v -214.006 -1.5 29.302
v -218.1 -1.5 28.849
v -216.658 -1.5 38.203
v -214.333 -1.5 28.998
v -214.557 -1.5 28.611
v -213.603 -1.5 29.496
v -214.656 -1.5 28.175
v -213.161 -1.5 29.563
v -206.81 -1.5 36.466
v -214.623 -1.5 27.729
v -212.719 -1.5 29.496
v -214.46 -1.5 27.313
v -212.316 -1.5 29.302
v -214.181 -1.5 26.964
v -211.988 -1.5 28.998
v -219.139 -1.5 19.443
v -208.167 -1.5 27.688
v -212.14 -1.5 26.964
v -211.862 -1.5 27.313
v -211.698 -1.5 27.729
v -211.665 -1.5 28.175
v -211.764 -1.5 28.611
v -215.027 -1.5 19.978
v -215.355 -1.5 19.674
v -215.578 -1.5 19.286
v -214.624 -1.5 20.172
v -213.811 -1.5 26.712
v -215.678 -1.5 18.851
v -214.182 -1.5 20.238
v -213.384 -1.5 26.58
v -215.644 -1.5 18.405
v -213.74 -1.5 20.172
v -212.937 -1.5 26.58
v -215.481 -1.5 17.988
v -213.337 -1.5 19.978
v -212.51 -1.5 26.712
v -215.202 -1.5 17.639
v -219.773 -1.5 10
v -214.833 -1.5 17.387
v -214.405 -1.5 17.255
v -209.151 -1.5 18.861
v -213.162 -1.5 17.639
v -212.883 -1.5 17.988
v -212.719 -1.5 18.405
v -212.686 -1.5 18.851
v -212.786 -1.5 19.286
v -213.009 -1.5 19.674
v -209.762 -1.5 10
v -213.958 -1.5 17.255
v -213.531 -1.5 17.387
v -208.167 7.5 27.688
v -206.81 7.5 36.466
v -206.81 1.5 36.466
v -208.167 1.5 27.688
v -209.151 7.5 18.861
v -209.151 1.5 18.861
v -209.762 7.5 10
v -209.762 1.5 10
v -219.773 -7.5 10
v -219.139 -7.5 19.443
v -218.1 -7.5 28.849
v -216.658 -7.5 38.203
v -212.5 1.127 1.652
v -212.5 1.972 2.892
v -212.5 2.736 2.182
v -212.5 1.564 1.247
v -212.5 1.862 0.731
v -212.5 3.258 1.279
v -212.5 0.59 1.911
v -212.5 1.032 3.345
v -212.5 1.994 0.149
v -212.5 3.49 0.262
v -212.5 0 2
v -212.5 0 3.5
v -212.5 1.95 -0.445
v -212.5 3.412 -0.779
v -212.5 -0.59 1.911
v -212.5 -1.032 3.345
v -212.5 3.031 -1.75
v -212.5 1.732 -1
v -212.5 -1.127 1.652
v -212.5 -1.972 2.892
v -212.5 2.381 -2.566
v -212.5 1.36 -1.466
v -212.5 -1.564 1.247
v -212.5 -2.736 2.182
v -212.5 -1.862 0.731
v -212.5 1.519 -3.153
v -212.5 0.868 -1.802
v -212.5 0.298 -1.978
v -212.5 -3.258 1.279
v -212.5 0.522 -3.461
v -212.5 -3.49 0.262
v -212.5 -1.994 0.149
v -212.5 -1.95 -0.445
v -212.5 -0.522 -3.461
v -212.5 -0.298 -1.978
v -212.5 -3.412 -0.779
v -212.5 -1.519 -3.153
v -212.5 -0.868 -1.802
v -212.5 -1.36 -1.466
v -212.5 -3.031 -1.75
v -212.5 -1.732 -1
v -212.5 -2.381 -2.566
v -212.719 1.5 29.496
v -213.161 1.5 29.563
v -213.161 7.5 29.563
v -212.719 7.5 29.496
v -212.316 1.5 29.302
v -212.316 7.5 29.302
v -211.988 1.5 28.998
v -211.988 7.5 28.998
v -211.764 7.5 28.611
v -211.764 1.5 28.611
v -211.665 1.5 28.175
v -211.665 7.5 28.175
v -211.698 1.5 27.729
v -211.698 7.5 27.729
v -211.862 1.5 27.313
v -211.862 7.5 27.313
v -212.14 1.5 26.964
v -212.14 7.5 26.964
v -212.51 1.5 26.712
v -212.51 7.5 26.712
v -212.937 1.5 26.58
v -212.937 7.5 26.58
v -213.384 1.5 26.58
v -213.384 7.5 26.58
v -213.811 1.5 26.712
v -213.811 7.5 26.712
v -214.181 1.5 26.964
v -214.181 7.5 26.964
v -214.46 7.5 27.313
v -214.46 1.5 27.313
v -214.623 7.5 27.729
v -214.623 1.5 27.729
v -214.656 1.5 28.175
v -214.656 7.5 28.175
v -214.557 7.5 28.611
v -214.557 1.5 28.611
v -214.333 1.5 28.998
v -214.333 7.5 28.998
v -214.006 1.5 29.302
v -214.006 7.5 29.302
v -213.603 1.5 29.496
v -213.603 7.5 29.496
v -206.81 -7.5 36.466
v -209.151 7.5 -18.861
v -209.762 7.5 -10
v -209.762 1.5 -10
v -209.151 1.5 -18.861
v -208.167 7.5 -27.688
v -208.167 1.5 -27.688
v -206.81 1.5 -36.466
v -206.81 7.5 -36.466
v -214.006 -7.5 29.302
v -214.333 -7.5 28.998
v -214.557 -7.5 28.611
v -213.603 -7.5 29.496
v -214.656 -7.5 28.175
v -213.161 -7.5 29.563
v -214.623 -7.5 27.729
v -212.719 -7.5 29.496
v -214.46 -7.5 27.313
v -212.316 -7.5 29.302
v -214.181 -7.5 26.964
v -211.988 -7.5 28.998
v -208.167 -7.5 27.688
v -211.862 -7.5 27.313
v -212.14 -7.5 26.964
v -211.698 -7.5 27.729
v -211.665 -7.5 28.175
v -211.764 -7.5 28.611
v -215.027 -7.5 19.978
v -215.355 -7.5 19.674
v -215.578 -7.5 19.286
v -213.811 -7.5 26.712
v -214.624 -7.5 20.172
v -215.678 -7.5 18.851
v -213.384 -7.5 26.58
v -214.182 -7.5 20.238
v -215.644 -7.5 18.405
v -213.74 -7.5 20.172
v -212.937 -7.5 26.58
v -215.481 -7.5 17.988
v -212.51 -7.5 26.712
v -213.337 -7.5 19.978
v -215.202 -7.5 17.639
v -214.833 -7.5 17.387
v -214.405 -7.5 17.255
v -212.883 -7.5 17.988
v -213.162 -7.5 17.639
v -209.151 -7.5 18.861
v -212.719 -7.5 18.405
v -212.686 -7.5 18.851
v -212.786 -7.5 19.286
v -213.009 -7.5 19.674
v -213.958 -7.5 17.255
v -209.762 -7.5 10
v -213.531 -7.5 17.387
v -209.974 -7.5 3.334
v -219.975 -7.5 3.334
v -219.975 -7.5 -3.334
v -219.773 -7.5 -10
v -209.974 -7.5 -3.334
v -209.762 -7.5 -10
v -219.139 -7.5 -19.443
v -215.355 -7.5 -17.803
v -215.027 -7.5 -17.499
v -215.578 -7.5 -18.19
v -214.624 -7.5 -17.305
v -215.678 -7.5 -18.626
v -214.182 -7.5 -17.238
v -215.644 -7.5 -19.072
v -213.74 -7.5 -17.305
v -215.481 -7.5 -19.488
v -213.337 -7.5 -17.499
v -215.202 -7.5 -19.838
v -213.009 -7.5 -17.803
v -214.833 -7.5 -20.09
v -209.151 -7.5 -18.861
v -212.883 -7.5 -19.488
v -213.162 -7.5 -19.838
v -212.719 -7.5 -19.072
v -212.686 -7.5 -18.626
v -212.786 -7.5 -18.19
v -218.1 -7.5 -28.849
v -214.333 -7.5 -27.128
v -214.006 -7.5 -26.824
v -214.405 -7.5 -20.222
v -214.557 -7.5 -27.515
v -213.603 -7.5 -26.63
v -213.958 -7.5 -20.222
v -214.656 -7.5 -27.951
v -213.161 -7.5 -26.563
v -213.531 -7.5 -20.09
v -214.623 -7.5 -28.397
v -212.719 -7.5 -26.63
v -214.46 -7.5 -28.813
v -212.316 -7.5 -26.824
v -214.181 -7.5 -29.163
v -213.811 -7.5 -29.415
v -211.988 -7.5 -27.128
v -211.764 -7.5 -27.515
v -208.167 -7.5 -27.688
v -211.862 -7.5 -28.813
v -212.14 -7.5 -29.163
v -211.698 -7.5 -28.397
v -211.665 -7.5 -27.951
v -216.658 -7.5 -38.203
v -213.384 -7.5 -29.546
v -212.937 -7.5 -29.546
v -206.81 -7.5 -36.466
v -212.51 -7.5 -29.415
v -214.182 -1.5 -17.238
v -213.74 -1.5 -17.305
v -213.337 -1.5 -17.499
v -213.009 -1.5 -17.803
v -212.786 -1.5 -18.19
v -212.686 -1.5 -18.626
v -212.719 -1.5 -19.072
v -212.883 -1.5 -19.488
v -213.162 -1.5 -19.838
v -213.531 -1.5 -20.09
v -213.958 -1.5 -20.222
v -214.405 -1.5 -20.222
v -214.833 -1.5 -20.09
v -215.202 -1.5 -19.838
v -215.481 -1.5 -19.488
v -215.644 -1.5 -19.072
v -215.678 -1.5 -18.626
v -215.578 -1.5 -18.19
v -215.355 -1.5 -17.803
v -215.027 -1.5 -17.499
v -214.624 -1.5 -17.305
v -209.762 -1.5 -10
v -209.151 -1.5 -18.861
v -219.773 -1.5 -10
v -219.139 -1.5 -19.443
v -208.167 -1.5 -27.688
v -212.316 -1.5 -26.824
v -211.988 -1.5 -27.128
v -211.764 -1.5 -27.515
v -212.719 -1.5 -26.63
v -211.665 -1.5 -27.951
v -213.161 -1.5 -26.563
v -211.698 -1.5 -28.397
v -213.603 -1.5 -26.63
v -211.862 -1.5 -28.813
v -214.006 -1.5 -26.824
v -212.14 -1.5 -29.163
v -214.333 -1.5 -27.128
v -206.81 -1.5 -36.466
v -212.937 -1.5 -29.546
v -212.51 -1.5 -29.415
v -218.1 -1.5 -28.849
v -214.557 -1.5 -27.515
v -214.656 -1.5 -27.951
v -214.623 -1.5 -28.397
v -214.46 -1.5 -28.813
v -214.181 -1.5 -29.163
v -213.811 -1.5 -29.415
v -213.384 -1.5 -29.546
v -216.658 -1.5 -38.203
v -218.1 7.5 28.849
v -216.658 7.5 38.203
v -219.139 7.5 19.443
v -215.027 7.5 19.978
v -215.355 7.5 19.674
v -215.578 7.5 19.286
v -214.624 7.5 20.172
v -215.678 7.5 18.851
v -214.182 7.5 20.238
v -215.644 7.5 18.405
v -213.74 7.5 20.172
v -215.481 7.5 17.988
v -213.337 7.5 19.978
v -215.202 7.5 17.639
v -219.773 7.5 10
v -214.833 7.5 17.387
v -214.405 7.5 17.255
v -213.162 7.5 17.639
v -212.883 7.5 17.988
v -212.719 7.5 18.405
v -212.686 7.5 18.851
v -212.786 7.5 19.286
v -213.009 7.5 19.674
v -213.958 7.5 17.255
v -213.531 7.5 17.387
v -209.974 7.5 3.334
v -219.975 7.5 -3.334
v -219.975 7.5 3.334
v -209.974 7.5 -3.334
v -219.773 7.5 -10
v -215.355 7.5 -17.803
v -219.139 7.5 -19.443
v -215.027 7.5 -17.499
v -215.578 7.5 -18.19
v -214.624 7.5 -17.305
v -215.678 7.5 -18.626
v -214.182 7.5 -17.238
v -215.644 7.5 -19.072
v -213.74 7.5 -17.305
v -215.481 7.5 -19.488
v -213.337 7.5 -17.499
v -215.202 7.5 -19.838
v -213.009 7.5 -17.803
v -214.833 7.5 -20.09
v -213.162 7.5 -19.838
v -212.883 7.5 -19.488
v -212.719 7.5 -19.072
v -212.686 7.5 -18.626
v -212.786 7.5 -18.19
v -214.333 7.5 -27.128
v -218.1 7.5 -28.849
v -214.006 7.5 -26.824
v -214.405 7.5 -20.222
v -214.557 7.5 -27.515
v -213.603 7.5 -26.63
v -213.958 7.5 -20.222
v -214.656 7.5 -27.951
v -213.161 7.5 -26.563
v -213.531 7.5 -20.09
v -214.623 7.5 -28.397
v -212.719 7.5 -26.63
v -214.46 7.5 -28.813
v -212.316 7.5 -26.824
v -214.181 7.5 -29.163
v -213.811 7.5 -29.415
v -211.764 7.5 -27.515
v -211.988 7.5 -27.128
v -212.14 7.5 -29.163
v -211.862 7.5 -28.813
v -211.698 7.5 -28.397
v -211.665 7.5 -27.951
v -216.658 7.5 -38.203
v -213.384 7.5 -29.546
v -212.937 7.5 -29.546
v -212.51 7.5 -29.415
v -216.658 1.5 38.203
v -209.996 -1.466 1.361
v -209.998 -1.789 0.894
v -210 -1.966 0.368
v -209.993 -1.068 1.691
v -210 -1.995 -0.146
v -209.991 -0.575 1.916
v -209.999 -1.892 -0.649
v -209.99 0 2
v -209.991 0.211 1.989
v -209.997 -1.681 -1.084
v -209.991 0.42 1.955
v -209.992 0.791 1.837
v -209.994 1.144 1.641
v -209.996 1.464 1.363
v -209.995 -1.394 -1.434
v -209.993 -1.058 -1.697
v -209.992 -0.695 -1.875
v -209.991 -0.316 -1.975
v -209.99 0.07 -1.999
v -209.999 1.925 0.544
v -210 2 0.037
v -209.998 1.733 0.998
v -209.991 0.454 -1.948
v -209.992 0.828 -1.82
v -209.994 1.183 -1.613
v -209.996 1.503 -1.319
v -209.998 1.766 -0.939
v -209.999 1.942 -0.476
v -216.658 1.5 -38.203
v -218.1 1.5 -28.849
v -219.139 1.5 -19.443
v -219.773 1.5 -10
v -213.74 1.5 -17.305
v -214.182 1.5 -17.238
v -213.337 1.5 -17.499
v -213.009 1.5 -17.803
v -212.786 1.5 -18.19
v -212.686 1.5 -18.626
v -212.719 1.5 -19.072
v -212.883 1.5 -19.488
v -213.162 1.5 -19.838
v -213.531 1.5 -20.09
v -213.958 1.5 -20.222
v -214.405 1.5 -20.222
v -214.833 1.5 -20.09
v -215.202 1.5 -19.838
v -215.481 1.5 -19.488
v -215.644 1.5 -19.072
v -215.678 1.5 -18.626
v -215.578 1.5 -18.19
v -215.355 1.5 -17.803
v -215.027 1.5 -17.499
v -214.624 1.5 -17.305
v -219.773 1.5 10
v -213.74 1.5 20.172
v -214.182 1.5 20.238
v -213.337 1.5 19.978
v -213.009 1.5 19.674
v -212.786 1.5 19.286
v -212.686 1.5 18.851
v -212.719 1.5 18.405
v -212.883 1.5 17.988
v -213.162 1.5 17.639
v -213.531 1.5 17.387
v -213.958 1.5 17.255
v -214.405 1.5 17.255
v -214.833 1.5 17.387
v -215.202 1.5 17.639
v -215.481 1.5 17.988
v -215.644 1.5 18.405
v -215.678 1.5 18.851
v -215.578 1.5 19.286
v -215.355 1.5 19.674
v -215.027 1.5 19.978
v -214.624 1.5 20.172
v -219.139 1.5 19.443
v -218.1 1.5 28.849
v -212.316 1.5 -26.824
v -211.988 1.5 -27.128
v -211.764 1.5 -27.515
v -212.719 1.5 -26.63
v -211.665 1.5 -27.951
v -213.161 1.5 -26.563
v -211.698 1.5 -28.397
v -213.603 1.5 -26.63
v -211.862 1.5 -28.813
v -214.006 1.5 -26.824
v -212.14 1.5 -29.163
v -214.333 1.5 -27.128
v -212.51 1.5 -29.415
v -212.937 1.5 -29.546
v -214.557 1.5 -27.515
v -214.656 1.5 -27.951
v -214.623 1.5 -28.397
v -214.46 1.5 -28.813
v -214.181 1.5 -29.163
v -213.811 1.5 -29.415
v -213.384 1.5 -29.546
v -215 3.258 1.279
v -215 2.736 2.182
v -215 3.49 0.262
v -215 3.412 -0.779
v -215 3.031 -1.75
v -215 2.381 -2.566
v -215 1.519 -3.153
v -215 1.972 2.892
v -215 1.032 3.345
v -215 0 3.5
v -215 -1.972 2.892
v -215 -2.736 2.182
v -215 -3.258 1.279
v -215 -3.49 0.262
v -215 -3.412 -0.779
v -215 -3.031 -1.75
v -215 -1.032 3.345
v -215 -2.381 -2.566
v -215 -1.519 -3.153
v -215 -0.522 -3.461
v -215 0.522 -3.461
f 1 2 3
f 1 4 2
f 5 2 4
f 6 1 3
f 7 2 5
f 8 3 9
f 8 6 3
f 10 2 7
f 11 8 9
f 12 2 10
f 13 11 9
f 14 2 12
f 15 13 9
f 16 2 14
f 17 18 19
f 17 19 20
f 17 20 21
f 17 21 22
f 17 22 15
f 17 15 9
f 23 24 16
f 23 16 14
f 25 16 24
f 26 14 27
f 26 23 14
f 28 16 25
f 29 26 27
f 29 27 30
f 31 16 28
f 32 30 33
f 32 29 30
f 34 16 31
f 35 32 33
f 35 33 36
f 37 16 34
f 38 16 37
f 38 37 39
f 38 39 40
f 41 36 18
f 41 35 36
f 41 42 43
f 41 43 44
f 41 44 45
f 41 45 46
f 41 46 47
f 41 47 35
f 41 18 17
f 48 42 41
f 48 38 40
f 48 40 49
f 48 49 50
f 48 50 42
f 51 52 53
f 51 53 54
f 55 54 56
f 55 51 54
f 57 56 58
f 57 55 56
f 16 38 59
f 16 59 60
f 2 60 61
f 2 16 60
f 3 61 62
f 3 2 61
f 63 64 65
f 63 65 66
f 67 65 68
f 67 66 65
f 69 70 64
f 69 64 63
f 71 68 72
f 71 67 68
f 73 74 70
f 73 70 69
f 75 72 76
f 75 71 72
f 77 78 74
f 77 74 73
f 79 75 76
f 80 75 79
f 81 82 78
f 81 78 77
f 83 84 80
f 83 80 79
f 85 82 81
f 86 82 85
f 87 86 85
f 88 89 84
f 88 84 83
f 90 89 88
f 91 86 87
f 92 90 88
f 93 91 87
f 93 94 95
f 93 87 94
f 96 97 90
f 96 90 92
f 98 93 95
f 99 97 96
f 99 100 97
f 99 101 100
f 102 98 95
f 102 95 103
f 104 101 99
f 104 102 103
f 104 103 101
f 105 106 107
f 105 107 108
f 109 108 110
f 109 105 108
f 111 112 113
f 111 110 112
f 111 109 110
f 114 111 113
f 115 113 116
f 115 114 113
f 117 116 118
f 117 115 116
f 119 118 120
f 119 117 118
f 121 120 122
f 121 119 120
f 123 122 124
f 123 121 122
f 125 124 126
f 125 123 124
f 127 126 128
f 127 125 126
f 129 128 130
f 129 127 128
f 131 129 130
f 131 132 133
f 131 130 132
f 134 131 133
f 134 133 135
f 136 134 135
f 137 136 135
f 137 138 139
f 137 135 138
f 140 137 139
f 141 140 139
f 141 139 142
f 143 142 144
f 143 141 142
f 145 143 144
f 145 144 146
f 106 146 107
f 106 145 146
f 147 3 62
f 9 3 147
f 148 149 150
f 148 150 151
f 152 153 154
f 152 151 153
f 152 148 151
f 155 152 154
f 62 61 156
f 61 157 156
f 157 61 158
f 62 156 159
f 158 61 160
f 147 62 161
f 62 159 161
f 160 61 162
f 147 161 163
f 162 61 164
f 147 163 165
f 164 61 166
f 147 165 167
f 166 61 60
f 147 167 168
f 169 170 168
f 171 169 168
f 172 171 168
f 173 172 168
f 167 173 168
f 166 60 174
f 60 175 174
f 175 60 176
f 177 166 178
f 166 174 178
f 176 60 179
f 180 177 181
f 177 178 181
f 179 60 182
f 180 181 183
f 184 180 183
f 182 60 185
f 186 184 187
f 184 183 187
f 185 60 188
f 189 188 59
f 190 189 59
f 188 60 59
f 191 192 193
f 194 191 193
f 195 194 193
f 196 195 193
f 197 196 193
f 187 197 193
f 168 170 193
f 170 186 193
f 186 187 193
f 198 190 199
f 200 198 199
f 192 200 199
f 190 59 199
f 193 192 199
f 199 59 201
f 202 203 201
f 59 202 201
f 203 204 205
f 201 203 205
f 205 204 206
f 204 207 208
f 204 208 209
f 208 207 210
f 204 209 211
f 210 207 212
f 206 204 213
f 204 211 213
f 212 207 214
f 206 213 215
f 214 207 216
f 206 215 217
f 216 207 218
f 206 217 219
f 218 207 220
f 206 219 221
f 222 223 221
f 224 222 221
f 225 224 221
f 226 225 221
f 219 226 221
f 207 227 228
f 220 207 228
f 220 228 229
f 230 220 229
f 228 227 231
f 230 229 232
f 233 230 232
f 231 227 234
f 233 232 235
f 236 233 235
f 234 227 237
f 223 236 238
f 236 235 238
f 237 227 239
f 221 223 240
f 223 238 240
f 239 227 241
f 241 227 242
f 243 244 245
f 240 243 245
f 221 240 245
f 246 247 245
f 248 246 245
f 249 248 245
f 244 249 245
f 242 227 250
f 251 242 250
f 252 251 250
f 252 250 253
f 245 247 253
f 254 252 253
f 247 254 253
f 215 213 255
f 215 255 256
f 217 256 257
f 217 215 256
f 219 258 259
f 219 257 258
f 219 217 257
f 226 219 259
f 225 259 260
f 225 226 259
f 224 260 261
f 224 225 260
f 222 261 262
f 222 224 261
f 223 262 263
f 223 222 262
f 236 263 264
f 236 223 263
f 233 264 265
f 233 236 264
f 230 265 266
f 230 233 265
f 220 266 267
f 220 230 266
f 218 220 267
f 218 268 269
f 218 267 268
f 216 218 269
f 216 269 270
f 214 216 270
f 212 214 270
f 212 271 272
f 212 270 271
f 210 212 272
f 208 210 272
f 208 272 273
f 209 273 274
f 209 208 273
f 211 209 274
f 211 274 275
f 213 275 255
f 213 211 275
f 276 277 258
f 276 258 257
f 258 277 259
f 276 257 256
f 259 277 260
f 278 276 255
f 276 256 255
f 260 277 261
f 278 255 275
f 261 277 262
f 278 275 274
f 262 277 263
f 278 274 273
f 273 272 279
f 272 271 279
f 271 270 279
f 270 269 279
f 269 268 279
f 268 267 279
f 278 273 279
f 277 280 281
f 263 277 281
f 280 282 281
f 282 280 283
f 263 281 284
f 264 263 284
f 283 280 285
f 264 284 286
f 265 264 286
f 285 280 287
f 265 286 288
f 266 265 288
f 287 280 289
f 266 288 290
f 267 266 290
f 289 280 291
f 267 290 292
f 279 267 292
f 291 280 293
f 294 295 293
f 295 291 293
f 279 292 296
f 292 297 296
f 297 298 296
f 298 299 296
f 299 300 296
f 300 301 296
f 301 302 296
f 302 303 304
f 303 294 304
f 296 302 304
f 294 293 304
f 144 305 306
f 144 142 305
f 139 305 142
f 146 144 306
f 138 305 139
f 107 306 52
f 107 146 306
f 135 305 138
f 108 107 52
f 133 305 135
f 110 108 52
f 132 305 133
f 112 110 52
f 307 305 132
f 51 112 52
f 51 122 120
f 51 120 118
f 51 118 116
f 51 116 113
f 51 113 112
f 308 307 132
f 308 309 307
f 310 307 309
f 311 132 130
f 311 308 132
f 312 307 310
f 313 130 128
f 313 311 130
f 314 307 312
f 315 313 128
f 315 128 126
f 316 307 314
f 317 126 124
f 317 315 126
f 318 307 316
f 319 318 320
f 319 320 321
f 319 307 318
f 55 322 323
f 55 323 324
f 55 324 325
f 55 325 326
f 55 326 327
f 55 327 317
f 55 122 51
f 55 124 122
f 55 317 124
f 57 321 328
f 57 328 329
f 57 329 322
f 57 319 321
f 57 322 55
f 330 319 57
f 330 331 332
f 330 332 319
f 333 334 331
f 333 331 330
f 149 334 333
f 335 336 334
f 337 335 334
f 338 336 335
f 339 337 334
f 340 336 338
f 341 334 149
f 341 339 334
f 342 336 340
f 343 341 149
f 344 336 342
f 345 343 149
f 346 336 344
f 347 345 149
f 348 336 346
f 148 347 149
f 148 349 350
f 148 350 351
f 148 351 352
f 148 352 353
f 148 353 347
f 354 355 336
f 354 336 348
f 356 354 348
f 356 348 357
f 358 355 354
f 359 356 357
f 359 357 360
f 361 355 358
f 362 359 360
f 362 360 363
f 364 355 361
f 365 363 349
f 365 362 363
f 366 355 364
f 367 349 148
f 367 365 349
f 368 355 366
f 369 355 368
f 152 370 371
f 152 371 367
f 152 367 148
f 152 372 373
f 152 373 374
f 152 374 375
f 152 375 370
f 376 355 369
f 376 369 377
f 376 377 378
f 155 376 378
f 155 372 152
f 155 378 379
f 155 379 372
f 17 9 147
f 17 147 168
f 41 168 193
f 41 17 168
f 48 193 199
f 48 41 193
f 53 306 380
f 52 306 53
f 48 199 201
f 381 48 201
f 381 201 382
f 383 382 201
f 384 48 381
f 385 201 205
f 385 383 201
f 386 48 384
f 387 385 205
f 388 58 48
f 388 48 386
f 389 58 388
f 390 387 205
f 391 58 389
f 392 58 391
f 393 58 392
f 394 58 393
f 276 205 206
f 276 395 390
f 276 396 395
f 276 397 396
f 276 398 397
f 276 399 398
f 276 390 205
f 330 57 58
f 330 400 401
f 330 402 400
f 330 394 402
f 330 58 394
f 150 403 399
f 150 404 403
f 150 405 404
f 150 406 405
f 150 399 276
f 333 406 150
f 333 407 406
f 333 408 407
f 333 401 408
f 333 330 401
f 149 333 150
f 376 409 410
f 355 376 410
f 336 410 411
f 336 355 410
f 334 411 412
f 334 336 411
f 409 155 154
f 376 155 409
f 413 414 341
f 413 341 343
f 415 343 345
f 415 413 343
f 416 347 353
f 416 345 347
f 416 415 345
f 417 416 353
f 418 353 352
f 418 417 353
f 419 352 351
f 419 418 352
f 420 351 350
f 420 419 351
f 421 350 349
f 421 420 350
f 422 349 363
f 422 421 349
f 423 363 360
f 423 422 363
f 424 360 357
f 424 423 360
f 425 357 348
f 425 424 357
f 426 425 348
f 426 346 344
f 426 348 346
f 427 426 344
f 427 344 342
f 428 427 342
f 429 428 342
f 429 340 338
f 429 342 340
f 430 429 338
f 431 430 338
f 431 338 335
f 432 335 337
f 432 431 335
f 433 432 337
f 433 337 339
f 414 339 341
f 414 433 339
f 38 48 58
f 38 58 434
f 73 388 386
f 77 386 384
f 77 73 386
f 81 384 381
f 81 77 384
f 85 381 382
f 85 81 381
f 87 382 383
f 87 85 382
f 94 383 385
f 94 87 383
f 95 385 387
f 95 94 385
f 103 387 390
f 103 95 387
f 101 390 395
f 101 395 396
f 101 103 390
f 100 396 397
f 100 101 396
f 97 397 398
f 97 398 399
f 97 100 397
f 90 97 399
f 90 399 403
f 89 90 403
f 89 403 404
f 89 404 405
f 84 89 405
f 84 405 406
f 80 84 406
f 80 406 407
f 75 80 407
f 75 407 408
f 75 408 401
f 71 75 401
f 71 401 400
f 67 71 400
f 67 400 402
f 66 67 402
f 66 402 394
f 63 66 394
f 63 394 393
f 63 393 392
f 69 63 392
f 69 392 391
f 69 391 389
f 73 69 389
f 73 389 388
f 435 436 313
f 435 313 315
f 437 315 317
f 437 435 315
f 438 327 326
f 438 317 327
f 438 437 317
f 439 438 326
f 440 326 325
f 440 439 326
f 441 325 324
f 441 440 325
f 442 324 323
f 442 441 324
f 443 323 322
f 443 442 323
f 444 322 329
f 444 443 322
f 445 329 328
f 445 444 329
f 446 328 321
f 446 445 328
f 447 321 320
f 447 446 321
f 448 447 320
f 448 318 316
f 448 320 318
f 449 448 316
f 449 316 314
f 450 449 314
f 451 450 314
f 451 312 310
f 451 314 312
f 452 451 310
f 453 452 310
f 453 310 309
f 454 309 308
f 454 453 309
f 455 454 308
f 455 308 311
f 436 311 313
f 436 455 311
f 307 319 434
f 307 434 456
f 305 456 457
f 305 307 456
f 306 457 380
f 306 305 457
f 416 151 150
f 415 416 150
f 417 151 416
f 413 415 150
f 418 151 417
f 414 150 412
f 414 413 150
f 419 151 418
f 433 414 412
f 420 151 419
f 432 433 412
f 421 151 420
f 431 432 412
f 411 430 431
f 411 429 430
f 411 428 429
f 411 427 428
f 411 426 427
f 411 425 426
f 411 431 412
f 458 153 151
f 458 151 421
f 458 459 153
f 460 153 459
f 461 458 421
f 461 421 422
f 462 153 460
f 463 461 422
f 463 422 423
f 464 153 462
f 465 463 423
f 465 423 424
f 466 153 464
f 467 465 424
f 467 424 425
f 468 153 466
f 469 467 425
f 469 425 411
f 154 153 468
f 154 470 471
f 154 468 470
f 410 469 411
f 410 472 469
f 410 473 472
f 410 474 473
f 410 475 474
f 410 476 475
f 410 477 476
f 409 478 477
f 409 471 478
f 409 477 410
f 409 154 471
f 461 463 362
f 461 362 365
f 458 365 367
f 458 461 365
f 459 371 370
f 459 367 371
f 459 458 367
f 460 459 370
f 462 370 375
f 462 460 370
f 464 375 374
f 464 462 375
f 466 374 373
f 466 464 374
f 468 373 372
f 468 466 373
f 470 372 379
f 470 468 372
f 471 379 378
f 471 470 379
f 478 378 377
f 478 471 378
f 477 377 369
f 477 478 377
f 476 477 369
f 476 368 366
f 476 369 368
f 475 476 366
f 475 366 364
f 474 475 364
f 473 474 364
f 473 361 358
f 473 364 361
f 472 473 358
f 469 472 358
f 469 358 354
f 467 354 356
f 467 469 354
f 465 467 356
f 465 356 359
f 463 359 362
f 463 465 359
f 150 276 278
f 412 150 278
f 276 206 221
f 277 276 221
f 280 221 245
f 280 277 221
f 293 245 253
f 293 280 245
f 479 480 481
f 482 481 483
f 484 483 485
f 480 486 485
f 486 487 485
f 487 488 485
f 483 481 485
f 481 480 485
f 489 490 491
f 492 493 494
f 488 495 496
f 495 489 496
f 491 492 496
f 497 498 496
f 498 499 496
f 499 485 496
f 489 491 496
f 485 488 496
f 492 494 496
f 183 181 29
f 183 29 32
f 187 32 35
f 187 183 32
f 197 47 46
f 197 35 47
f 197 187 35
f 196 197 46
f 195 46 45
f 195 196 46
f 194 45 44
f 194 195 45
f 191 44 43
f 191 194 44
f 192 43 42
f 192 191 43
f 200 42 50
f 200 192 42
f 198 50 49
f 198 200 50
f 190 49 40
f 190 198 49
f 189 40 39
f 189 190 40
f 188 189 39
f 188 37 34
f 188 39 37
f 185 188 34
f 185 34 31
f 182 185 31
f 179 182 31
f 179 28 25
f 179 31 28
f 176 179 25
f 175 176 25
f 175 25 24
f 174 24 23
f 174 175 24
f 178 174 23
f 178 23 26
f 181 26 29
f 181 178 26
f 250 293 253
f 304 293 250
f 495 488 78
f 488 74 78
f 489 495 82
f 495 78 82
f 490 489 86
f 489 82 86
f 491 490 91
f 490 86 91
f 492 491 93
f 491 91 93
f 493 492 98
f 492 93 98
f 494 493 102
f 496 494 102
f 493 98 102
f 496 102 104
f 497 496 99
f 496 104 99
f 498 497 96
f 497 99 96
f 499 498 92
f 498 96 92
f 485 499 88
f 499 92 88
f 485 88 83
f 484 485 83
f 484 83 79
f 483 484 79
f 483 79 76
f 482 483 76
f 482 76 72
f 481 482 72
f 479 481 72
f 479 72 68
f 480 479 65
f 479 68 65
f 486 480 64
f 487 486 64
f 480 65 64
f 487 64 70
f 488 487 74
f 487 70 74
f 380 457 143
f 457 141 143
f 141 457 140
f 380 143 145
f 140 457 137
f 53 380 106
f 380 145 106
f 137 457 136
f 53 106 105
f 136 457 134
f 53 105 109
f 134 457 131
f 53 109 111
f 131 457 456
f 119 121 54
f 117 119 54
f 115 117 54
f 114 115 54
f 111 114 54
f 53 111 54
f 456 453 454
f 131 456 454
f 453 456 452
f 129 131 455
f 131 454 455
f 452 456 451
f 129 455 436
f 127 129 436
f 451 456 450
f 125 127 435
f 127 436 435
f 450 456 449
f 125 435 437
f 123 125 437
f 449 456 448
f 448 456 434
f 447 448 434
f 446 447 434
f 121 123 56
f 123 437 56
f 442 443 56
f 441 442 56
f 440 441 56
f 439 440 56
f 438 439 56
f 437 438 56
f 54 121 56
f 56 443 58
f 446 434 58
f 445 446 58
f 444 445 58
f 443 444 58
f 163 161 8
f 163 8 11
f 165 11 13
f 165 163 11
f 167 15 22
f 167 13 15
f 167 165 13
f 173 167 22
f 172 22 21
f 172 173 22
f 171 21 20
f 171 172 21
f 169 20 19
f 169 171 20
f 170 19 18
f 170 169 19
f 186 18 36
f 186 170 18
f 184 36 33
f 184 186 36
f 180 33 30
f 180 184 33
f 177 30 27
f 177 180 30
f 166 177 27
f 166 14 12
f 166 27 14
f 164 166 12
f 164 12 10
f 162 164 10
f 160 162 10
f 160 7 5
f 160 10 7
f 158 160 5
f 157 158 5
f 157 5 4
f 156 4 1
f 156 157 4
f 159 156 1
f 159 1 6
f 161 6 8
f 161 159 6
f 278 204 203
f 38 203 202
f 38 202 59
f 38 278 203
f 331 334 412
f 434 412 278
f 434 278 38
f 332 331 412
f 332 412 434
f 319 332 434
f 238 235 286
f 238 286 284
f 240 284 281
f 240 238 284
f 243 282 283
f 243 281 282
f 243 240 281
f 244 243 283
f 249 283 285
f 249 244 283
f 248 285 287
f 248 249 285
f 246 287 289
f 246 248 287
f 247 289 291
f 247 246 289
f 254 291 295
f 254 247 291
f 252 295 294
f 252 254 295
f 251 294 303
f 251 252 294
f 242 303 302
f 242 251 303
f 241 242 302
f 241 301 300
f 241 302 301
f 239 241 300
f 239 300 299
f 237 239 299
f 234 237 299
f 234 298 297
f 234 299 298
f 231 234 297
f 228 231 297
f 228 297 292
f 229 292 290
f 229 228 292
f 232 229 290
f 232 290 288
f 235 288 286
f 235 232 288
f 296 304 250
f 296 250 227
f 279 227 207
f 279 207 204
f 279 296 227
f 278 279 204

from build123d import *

# Parameters (mm, degrees)
BASE2_DEPTH            = 7.5
MOUNT2_START           = -1.5
MOUNT2_DEPTH           = 3
MOUNT_HOLE2_DEPTH      = 224.418192135
MOUNT_HOLE2_DEPTH_BACK = 224.418192135
SKETCH16_R             = 1.5
SKETCH17_R             = 2
SHAFT_HOLE_DEPTH       = 40.784051683
SKETCH18_W             = 2.5
SKETCH18_H             = 3.5


with BuildPart() as part:
    # Sketch13 → base2 (new, symmetric)
    with BuildSketch(Plane(origin=(0, 0, 0), x_dir=(1, 0, 0), z_dir=(0, 1, 0))):
        with BuildLine():
            ThreePointArc((-209.761769634, 10), (-208.70564487, 23.279901188), (-206.809628133, 36.46611731))
            Line((-206.809628133, 36.46611731), (-216.657705663, 38.202599087))
            ThreePointArc((-216.657705663, 38.202599087), (-218.670303662, 24.151569236), (-219.772609758, 10))
            Line((-219.772609758, 10), (-209.761769634, 10))
        make_face()
        with BuildLine():
            ThreePointArc((-209.761769634, -10), (-210, 0), (-209.761769634, 10))
            Line((-209.761769634, 10), (-219.772609758, 10))
            ThreePointArc((-219.772609758, 10), (-220, 0), (-219.772609758, -10))
            Line((-219.772609758, -10), (-209.761769634, -10))
        make_face()
        with BuildLine():
            Line((-216.657705663, -38.202599087), (-206.809628133, -36.46611731))
            ThreePointArc((-206.809628133, -36.46611731), (-208.70564487, -23.279901188), (-209.761769634, -10))
            Line((-209.761769634, -10), (-219.772609758, -10))
            ThreePointArc((-219.772609758, -10), (-218.670303662, -24.151569236), (-216.657705663, -38.202599087))
        make_face()
    extrude(amount=BASE2_DEPTH, both=True)

    # Sketch14 → mount2 (cut)
    with BuildSketch(Plane(origin=(0, 0, 0), x_dir=(1, 0, 0), z_dir=(0, 1, 0)).offset(MOUNT2_START)):
        with BuildLine():
            Line((-209.761769634, -10), (-219.772609758, -10))
            ThreePointArc((-219.772609758, -10), (-218.670303662, -24.151569236), (-216.657705663, -38.202599087))
            Line((-216.657705663, -38.202599087), (-206.809628133, -36.46611731))
            ThreePointArc((-206.809628133, -36.46611731), (-208.70564487, -23.279901188), (-209.761769634, -10))
        make_face()
        with BuildLine():
            Line((-209.761769634, 10), (-219.772609758, 10))
            ThreePointArc((-219.772609758, 10), (-218.670303662, 24.151569236), (-216.657705663, 38.202599087))
            Line((-216.657705663, 38.202599087), (-206.809628133, 36.46611731))
            ThreePointArc((-206.809628133, 36.46611731), (-208.70564487, 23.279901188), (-209.761769634, 10))
        make_face()
    extrude(amount=MOUNT2_DEPTH, mode=Mode.SUBTRACT)

    # Sketch16 → mount hole2 (cut, two sides: drawn at the far end of the back side and taken through both)
    with BuildSketch(Plane(origin=(0, 0, 0), x_dir=(1, 0, 0), z_dir=(0, 1, 0)).offset(-MOUNT_HOLE2_DEPTH_BACK)):
        with Locations(Location((-213.160645195, 28.063131327, 0), (0, 0, 270))):
            Circle(SKETCH16_R)
        with Locations(Location((-214.18186009, 18.738484691, 0), (0, 0, 270))):
            Circle(SKETCH16_R)
        with Locations(Location((-214.18186009, -18.738484691, 0), (0, 0, 270))):
            Circle(SKETCH16_R)
        with Locations(Location((-213.160645195, -28.063131327, 0), (0, 0, 270))):
            Circle(SKETCH16_R)
    extrude(amount=MOUNT_HOLE2_DEPTH + MOUNT_HOLE2_DEPTH_BACK, mode=Mode.SUBTRACT)

    # Sketch17 → shaft hole (cut, through all)
    with BuildSketch(Plane(origin=(-215, 0, 0), x_dir=(0, 0, -1), z_dir=(1, 0, 0))):
        with Locations(Location((0, 0, 0), (0, 0, 180))):
            Circle(SKETCH17_R)
    extrude(amount=SHAFT_HOLE_DEPTH, mode=Mode.SUBTRACT)

    # Sketch18 → bearinghole (revolve, cut)
    with BuildSketch(Plane(origin=(0, 0, 0), x_dir=(1, 0, 0), z_dir=(0, 1, 0)), mode=Mode.PRIVATE) as bearinghole_sk:
        with Locations((-213.75, 1.75)):
            Rectangle(SKETCH18_W, SKETCH18_H)
    revolve(bearinghole_sk.sketch.rotate(Axis((-215, 0, 0), (1, 0, 0)), 180), axis=Axis((-215, 0, 0), (1, 0, 0)), mode=Mode.SUBTRACT)


solid = part.part
